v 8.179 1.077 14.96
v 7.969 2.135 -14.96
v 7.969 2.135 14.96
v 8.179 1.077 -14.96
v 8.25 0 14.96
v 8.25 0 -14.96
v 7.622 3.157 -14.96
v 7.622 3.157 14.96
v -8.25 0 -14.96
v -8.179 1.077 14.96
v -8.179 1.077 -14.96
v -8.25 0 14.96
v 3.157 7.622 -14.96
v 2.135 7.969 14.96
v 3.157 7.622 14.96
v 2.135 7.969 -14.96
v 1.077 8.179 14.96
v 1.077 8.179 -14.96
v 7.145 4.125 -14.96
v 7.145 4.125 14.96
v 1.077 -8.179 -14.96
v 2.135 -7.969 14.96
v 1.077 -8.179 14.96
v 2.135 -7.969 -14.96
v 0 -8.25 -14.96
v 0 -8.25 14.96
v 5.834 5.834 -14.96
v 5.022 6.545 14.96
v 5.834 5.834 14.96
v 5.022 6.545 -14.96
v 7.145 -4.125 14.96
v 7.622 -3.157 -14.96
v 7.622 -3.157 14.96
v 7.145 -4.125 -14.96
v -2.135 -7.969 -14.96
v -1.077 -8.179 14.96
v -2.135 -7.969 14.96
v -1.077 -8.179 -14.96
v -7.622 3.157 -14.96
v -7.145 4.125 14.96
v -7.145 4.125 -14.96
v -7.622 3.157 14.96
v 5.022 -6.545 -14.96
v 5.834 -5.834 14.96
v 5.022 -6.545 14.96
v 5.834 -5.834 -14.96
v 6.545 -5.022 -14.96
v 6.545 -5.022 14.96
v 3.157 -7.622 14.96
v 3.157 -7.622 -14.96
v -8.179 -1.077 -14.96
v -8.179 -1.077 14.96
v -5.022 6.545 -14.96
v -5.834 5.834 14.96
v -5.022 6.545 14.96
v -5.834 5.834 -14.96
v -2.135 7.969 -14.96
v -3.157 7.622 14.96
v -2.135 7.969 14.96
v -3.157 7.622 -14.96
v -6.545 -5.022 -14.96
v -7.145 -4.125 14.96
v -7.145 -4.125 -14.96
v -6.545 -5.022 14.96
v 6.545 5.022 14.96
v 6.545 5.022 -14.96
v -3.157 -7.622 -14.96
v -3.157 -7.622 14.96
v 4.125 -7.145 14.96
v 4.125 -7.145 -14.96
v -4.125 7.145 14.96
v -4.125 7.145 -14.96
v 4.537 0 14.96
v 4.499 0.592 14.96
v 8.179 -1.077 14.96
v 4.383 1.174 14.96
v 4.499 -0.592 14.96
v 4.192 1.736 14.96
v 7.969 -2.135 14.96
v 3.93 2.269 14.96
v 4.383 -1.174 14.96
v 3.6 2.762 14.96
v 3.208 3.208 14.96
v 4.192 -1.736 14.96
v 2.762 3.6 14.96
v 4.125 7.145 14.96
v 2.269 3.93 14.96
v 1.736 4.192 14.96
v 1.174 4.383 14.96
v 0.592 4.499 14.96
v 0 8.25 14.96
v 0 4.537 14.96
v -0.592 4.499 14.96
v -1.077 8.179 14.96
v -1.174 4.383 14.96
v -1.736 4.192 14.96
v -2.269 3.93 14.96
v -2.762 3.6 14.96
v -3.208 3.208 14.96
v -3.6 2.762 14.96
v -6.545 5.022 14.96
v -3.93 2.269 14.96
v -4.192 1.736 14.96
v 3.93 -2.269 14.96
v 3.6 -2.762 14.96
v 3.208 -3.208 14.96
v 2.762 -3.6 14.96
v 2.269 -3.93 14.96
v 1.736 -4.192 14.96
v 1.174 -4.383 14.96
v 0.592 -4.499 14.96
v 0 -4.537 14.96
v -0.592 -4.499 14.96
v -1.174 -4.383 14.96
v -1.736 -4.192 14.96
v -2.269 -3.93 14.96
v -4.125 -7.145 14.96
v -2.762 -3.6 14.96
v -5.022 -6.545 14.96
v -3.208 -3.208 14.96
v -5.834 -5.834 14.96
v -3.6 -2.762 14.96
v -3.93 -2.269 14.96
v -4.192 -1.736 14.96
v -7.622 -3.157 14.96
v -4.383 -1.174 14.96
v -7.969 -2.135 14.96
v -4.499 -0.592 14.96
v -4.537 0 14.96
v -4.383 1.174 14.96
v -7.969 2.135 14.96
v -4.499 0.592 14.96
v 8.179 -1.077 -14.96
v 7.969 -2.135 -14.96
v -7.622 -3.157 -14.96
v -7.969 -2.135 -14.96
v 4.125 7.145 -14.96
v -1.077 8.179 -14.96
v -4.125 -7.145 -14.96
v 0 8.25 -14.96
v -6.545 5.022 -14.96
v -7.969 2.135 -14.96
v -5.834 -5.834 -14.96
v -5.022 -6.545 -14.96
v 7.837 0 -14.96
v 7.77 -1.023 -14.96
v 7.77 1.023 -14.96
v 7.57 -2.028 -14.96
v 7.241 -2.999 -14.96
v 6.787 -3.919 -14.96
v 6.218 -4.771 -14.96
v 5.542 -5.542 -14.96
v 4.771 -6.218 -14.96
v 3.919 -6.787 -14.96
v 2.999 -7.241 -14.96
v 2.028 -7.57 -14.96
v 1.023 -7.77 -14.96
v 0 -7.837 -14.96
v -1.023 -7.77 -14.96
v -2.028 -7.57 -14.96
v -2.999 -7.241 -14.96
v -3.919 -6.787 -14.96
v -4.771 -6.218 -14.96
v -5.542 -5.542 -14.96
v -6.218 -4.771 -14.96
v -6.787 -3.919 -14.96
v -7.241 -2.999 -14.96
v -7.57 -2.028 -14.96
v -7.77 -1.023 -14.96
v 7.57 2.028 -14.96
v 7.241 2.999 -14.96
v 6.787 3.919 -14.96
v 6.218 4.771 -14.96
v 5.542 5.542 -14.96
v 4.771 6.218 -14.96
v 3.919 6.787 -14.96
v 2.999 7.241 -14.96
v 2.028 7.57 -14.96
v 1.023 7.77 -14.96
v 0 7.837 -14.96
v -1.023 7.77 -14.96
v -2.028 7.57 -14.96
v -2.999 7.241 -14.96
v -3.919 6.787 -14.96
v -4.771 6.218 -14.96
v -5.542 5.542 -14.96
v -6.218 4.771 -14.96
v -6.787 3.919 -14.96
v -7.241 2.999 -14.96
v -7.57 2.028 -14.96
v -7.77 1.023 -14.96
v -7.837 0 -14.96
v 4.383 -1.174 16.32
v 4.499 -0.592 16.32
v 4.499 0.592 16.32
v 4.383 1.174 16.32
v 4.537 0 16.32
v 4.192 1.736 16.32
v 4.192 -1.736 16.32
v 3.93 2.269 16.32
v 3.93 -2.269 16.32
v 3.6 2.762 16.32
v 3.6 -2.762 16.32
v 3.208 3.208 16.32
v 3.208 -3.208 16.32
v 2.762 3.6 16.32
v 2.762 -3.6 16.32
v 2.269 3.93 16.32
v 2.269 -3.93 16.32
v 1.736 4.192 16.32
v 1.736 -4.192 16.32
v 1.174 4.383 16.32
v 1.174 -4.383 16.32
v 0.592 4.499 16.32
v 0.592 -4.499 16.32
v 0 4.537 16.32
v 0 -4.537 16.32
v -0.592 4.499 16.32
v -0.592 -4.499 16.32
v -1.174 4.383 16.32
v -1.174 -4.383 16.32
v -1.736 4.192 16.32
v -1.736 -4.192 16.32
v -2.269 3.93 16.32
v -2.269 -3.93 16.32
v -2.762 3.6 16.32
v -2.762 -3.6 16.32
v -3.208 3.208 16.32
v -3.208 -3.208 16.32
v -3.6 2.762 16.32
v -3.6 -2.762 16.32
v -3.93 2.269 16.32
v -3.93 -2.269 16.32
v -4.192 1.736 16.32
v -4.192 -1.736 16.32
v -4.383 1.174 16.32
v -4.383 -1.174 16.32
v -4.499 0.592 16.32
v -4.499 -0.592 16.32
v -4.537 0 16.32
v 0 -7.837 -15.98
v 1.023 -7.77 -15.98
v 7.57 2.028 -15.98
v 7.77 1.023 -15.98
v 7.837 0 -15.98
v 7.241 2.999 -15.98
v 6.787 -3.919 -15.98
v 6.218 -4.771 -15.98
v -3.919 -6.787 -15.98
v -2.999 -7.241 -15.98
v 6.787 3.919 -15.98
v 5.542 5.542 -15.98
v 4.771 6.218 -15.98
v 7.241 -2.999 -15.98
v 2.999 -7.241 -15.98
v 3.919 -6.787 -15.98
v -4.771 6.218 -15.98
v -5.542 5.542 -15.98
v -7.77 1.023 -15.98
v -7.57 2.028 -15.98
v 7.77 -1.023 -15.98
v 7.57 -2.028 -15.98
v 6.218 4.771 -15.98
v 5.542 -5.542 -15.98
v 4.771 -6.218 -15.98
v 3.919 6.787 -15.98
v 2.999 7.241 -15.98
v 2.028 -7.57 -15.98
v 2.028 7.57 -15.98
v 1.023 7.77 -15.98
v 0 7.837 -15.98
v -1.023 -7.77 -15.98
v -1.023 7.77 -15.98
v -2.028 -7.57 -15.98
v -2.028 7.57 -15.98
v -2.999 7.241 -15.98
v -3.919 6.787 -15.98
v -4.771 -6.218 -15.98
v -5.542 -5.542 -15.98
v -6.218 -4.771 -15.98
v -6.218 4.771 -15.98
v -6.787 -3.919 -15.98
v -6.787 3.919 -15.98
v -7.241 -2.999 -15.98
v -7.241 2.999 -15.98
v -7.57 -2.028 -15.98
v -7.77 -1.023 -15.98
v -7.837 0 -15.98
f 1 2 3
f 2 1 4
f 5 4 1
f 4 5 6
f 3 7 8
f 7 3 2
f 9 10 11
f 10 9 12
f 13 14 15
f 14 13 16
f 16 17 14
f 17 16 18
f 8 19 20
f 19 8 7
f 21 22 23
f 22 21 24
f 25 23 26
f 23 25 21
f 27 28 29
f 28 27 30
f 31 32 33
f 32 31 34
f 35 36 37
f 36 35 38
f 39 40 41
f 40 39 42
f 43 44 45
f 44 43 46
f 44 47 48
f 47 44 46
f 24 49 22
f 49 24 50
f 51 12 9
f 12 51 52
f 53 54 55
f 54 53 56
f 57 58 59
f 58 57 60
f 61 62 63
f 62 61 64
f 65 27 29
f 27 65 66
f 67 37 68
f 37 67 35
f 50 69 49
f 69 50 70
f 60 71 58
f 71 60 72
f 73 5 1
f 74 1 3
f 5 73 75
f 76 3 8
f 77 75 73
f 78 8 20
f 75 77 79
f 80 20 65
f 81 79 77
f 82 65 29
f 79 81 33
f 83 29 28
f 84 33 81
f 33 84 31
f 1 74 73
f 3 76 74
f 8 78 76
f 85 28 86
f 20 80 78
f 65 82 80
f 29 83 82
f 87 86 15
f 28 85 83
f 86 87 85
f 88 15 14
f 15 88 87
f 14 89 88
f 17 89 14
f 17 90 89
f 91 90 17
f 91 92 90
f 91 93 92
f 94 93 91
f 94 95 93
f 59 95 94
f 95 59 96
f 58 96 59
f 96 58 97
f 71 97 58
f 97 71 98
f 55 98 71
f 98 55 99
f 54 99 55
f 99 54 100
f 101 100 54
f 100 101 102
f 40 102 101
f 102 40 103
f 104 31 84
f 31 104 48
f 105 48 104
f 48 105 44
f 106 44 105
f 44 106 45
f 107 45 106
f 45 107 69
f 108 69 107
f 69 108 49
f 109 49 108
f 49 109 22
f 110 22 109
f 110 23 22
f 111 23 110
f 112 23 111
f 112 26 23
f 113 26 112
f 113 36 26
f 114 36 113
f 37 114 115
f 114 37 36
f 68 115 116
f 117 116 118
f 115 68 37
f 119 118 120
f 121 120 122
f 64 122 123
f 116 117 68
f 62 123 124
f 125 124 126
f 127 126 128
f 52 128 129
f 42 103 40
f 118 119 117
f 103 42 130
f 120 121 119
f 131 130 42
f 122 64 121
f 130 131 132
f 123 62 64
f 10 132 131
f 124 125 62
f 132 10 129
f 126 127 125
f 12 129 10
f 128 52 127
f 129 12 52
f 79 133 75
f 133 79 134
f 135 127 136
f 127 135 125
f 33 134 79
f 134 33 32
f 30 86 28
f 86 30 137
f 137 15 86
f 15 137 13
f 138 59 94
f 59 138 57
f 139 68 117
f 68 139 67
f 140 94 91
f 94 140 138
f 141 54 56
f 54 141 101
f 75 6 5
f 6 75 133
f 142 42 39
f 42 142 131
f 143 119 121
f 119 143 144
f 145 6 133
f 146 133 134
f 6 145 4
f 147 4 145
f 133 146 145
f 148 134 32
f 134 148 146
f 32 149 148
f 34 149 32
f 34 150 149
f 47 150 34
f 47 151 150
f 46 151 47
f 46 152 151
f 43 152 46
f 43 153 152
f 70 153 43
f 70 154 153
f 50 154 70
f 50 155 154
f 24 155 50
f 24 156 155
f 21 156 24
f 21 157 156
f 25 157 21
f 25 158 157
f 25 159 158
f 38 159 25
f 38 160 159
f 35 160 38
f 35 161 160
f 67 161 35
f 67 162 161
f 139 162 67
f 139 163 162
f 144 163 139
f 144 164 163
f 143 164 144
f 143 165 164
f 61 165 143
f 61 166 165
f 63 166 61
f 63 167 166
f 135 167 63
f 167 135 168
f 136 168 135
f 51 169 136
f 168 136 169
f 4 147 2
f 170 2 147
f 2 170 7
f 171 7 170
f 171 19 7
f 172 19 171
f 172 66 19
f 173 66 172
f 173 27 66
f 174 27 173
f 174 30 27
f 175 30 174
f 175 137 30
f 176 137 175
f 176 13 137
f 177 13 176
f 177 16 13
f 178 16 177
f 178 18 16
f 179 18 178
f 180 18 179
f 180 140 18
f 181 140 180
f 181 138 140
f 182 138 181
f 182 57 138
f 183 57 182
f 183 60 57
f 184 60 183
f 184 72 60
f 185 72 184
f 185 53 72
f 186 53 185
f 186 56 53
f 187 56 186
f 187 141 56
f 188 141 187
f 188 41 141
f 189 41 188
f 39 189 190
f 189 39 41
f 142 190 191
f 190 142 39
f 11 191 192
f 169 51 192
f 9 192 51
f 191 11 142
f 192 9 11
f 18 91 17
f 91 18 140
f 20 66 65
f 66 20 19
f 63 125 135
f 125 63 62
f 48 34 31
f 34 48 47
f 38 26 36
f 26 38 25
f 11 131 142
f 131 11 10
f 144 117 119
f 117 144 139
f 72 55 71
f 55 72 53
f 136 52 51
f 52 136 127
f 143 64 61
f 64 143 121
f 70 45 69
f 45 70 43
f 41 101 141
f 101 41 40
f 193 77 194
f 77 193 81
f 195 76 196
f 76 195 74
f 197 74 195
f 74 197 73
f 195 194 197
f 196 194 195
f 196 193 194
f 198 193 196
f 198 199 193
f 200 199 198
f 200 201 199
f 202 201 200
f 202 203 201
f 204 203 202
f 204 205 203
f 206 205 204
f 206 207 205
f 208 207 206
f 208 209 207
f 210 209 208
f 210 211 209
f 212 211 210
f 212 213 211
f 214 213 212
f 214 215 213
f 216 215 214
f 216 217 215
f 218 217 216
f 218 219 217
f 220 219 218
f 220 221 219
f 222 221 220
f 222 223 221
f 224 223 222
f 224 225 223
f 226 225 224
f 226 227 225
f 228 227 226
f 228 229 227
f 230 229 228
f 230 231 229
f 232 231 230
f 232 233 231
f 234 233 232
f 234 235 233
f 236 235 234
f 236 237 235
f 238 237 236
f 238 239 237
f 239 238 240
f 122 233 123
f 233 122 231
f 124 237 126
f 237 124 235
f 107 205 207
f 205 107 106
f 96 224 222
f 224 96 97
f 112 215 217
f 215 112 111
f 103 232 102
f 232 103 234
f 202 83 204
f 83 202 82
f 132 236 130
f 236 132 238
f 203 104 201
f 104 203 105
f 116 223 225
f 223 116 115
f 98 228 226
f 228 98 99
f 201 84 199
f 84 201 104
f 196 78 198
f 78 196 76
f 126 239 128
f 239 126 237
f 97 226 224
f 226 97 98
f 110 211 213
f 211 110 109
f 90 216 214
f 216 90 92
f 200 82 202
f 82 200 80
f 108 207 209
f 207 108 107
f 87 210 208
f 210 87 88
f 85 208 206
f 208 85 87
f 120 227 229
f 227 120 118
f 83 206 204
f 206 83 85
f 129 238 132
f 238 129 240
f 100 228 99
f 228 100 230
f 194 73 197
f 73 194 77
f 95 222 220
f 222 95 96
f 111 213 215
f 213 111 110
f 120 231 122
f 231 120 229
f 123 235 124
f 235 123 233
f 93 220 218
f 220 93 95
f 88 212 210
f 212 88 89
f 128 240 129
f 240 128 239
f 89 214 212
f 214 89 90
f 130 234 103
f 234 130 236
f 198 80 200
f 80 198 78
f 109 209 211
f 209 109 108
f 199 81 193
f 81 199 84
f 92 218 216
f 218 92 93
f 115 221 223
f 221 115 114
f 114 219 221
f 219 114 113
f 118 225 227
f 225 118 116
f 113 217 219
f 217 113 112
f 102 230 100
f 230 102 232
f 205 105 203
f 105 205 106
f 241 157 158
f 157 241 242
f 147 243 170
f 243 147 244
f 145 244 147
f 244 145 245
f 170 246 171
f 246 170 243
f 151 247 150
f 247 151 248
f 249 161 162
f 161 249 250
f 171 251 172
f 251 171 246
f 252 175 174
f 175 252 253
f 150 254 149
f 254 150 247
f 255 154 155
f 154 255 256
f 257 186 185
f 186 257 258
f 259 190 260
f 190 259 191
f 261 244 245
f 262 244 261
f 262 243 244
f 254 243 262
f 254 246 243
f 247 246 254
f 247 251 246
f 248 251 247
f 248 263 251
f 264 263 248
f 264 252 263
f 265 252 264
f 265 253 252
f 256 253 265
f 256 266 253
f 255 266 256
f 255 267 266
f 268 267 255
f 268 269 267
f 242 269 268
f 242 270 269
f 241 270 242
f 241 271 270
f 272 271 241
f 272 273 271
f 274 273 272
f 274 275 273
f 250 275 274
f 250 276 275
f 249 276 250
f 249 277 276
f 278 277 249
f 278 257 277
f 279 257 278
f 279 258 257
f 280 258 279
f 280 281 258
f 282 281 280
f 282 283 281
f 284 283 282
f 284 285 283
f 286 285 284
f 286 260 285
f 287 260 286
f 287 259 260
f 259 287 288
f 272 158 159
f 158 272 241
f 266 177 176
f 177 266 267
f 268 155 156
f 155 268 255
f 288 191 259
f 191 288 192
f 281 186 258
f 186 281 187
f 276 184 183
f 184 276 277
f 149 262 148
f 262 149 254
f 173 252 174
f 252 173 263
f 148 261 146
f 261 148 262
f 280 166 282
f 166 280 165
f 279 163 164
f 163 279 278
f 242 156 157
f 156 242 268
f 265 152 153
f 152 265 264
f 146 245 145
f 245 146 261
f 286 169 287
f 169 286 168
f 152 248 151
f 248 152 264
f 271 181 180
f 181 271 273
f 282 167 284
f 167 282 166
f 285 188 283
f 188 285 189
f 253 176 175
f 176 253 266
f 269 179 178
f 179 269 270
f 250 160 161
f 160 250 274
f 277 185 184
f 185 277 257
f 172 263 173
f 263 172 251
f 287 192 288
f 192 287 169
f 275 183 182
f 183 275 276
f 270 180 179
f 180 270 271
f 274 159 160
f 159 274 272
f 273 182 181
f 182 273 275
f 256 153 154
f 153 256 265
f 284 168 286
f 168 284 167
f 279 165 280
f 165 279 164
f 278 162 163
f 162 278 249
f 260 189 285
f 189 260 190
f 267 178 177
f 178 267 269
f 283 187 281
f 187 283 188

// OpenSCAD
// Forge sat_clock — real 16340 cell (Ø16.5 × 34 mm)
// Local Y = length (matches RealPartSpec / sat-pins ±Y terminals)
// openscad -o cell.stl -D 'radius=8.25' -D 'height=34' -D 'fn=48' assets/scad/sat_cell.scad

radius = 8.25;
height = 34;
fn = 48;

union() {
  cylinder(h = height * 0.88, r = radius, center = true, $fn = fn);
  translate([0, 0, height * 0.44])
    cylinder(h = height * 0.08, r = radius * 0.55, center = true, $fn = fn);
  translate([0, 0, -height * 0.44])
    cylinder(h = height * 0.06, r = radius * 0.95, center = true, $fn = fn);
}
